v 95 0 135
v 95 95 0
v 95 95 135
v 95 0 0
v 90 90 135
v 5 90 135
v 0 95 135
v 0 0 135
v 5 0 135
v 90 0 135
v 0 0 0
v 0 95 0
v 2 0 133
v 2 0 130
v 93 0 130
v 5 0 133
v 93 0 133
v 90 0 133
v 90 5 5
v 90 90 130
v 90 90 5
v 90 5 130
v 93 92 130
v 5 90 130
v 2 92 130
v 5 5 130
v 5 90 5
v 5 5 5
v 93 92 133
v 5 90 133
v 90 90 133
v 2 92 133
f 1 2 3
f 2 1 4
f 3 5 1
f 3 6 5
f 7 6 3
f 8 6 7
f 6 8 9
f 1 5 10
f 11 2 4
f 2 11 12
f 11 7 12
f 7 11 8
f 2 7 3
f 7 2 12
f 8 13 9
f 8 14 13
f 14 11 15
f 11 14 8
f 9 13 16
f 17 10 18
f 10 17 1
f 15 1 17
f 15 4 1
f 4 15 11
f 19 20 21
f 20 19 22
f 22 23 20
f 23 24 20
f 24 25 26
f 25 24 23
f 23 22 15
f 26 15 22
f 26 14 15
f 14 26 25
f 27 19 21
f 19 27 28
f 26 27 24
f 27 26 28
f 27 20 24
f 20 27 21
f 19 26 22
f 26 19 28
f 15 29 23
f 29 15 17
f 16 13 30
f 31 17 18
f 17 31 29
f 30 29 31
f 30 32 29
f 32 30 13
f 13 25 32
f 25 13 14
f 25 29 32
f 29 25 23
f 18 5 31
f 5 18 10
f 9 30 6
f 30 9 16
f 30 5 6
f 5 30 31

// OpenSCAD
$fn=360;
//67x93x22
//cards = 85x125x10
x=95;
y=95;
z=135;
cardx=85;
cardy=y-5;
cardz=125;
base=31;

difference() {
    translate([0,0,0])
    cube([x,y,z]);
    //cards gap1
    translate([x-90,5,5])
    cube([cardx,cardy-5,cardz]);
    //lid gaps
    translate([2,0,z-5])
    cube([x-4,y-3,3]);
    translate([5,0,z-4])
    cube([x-10,y-5,5]);
}
